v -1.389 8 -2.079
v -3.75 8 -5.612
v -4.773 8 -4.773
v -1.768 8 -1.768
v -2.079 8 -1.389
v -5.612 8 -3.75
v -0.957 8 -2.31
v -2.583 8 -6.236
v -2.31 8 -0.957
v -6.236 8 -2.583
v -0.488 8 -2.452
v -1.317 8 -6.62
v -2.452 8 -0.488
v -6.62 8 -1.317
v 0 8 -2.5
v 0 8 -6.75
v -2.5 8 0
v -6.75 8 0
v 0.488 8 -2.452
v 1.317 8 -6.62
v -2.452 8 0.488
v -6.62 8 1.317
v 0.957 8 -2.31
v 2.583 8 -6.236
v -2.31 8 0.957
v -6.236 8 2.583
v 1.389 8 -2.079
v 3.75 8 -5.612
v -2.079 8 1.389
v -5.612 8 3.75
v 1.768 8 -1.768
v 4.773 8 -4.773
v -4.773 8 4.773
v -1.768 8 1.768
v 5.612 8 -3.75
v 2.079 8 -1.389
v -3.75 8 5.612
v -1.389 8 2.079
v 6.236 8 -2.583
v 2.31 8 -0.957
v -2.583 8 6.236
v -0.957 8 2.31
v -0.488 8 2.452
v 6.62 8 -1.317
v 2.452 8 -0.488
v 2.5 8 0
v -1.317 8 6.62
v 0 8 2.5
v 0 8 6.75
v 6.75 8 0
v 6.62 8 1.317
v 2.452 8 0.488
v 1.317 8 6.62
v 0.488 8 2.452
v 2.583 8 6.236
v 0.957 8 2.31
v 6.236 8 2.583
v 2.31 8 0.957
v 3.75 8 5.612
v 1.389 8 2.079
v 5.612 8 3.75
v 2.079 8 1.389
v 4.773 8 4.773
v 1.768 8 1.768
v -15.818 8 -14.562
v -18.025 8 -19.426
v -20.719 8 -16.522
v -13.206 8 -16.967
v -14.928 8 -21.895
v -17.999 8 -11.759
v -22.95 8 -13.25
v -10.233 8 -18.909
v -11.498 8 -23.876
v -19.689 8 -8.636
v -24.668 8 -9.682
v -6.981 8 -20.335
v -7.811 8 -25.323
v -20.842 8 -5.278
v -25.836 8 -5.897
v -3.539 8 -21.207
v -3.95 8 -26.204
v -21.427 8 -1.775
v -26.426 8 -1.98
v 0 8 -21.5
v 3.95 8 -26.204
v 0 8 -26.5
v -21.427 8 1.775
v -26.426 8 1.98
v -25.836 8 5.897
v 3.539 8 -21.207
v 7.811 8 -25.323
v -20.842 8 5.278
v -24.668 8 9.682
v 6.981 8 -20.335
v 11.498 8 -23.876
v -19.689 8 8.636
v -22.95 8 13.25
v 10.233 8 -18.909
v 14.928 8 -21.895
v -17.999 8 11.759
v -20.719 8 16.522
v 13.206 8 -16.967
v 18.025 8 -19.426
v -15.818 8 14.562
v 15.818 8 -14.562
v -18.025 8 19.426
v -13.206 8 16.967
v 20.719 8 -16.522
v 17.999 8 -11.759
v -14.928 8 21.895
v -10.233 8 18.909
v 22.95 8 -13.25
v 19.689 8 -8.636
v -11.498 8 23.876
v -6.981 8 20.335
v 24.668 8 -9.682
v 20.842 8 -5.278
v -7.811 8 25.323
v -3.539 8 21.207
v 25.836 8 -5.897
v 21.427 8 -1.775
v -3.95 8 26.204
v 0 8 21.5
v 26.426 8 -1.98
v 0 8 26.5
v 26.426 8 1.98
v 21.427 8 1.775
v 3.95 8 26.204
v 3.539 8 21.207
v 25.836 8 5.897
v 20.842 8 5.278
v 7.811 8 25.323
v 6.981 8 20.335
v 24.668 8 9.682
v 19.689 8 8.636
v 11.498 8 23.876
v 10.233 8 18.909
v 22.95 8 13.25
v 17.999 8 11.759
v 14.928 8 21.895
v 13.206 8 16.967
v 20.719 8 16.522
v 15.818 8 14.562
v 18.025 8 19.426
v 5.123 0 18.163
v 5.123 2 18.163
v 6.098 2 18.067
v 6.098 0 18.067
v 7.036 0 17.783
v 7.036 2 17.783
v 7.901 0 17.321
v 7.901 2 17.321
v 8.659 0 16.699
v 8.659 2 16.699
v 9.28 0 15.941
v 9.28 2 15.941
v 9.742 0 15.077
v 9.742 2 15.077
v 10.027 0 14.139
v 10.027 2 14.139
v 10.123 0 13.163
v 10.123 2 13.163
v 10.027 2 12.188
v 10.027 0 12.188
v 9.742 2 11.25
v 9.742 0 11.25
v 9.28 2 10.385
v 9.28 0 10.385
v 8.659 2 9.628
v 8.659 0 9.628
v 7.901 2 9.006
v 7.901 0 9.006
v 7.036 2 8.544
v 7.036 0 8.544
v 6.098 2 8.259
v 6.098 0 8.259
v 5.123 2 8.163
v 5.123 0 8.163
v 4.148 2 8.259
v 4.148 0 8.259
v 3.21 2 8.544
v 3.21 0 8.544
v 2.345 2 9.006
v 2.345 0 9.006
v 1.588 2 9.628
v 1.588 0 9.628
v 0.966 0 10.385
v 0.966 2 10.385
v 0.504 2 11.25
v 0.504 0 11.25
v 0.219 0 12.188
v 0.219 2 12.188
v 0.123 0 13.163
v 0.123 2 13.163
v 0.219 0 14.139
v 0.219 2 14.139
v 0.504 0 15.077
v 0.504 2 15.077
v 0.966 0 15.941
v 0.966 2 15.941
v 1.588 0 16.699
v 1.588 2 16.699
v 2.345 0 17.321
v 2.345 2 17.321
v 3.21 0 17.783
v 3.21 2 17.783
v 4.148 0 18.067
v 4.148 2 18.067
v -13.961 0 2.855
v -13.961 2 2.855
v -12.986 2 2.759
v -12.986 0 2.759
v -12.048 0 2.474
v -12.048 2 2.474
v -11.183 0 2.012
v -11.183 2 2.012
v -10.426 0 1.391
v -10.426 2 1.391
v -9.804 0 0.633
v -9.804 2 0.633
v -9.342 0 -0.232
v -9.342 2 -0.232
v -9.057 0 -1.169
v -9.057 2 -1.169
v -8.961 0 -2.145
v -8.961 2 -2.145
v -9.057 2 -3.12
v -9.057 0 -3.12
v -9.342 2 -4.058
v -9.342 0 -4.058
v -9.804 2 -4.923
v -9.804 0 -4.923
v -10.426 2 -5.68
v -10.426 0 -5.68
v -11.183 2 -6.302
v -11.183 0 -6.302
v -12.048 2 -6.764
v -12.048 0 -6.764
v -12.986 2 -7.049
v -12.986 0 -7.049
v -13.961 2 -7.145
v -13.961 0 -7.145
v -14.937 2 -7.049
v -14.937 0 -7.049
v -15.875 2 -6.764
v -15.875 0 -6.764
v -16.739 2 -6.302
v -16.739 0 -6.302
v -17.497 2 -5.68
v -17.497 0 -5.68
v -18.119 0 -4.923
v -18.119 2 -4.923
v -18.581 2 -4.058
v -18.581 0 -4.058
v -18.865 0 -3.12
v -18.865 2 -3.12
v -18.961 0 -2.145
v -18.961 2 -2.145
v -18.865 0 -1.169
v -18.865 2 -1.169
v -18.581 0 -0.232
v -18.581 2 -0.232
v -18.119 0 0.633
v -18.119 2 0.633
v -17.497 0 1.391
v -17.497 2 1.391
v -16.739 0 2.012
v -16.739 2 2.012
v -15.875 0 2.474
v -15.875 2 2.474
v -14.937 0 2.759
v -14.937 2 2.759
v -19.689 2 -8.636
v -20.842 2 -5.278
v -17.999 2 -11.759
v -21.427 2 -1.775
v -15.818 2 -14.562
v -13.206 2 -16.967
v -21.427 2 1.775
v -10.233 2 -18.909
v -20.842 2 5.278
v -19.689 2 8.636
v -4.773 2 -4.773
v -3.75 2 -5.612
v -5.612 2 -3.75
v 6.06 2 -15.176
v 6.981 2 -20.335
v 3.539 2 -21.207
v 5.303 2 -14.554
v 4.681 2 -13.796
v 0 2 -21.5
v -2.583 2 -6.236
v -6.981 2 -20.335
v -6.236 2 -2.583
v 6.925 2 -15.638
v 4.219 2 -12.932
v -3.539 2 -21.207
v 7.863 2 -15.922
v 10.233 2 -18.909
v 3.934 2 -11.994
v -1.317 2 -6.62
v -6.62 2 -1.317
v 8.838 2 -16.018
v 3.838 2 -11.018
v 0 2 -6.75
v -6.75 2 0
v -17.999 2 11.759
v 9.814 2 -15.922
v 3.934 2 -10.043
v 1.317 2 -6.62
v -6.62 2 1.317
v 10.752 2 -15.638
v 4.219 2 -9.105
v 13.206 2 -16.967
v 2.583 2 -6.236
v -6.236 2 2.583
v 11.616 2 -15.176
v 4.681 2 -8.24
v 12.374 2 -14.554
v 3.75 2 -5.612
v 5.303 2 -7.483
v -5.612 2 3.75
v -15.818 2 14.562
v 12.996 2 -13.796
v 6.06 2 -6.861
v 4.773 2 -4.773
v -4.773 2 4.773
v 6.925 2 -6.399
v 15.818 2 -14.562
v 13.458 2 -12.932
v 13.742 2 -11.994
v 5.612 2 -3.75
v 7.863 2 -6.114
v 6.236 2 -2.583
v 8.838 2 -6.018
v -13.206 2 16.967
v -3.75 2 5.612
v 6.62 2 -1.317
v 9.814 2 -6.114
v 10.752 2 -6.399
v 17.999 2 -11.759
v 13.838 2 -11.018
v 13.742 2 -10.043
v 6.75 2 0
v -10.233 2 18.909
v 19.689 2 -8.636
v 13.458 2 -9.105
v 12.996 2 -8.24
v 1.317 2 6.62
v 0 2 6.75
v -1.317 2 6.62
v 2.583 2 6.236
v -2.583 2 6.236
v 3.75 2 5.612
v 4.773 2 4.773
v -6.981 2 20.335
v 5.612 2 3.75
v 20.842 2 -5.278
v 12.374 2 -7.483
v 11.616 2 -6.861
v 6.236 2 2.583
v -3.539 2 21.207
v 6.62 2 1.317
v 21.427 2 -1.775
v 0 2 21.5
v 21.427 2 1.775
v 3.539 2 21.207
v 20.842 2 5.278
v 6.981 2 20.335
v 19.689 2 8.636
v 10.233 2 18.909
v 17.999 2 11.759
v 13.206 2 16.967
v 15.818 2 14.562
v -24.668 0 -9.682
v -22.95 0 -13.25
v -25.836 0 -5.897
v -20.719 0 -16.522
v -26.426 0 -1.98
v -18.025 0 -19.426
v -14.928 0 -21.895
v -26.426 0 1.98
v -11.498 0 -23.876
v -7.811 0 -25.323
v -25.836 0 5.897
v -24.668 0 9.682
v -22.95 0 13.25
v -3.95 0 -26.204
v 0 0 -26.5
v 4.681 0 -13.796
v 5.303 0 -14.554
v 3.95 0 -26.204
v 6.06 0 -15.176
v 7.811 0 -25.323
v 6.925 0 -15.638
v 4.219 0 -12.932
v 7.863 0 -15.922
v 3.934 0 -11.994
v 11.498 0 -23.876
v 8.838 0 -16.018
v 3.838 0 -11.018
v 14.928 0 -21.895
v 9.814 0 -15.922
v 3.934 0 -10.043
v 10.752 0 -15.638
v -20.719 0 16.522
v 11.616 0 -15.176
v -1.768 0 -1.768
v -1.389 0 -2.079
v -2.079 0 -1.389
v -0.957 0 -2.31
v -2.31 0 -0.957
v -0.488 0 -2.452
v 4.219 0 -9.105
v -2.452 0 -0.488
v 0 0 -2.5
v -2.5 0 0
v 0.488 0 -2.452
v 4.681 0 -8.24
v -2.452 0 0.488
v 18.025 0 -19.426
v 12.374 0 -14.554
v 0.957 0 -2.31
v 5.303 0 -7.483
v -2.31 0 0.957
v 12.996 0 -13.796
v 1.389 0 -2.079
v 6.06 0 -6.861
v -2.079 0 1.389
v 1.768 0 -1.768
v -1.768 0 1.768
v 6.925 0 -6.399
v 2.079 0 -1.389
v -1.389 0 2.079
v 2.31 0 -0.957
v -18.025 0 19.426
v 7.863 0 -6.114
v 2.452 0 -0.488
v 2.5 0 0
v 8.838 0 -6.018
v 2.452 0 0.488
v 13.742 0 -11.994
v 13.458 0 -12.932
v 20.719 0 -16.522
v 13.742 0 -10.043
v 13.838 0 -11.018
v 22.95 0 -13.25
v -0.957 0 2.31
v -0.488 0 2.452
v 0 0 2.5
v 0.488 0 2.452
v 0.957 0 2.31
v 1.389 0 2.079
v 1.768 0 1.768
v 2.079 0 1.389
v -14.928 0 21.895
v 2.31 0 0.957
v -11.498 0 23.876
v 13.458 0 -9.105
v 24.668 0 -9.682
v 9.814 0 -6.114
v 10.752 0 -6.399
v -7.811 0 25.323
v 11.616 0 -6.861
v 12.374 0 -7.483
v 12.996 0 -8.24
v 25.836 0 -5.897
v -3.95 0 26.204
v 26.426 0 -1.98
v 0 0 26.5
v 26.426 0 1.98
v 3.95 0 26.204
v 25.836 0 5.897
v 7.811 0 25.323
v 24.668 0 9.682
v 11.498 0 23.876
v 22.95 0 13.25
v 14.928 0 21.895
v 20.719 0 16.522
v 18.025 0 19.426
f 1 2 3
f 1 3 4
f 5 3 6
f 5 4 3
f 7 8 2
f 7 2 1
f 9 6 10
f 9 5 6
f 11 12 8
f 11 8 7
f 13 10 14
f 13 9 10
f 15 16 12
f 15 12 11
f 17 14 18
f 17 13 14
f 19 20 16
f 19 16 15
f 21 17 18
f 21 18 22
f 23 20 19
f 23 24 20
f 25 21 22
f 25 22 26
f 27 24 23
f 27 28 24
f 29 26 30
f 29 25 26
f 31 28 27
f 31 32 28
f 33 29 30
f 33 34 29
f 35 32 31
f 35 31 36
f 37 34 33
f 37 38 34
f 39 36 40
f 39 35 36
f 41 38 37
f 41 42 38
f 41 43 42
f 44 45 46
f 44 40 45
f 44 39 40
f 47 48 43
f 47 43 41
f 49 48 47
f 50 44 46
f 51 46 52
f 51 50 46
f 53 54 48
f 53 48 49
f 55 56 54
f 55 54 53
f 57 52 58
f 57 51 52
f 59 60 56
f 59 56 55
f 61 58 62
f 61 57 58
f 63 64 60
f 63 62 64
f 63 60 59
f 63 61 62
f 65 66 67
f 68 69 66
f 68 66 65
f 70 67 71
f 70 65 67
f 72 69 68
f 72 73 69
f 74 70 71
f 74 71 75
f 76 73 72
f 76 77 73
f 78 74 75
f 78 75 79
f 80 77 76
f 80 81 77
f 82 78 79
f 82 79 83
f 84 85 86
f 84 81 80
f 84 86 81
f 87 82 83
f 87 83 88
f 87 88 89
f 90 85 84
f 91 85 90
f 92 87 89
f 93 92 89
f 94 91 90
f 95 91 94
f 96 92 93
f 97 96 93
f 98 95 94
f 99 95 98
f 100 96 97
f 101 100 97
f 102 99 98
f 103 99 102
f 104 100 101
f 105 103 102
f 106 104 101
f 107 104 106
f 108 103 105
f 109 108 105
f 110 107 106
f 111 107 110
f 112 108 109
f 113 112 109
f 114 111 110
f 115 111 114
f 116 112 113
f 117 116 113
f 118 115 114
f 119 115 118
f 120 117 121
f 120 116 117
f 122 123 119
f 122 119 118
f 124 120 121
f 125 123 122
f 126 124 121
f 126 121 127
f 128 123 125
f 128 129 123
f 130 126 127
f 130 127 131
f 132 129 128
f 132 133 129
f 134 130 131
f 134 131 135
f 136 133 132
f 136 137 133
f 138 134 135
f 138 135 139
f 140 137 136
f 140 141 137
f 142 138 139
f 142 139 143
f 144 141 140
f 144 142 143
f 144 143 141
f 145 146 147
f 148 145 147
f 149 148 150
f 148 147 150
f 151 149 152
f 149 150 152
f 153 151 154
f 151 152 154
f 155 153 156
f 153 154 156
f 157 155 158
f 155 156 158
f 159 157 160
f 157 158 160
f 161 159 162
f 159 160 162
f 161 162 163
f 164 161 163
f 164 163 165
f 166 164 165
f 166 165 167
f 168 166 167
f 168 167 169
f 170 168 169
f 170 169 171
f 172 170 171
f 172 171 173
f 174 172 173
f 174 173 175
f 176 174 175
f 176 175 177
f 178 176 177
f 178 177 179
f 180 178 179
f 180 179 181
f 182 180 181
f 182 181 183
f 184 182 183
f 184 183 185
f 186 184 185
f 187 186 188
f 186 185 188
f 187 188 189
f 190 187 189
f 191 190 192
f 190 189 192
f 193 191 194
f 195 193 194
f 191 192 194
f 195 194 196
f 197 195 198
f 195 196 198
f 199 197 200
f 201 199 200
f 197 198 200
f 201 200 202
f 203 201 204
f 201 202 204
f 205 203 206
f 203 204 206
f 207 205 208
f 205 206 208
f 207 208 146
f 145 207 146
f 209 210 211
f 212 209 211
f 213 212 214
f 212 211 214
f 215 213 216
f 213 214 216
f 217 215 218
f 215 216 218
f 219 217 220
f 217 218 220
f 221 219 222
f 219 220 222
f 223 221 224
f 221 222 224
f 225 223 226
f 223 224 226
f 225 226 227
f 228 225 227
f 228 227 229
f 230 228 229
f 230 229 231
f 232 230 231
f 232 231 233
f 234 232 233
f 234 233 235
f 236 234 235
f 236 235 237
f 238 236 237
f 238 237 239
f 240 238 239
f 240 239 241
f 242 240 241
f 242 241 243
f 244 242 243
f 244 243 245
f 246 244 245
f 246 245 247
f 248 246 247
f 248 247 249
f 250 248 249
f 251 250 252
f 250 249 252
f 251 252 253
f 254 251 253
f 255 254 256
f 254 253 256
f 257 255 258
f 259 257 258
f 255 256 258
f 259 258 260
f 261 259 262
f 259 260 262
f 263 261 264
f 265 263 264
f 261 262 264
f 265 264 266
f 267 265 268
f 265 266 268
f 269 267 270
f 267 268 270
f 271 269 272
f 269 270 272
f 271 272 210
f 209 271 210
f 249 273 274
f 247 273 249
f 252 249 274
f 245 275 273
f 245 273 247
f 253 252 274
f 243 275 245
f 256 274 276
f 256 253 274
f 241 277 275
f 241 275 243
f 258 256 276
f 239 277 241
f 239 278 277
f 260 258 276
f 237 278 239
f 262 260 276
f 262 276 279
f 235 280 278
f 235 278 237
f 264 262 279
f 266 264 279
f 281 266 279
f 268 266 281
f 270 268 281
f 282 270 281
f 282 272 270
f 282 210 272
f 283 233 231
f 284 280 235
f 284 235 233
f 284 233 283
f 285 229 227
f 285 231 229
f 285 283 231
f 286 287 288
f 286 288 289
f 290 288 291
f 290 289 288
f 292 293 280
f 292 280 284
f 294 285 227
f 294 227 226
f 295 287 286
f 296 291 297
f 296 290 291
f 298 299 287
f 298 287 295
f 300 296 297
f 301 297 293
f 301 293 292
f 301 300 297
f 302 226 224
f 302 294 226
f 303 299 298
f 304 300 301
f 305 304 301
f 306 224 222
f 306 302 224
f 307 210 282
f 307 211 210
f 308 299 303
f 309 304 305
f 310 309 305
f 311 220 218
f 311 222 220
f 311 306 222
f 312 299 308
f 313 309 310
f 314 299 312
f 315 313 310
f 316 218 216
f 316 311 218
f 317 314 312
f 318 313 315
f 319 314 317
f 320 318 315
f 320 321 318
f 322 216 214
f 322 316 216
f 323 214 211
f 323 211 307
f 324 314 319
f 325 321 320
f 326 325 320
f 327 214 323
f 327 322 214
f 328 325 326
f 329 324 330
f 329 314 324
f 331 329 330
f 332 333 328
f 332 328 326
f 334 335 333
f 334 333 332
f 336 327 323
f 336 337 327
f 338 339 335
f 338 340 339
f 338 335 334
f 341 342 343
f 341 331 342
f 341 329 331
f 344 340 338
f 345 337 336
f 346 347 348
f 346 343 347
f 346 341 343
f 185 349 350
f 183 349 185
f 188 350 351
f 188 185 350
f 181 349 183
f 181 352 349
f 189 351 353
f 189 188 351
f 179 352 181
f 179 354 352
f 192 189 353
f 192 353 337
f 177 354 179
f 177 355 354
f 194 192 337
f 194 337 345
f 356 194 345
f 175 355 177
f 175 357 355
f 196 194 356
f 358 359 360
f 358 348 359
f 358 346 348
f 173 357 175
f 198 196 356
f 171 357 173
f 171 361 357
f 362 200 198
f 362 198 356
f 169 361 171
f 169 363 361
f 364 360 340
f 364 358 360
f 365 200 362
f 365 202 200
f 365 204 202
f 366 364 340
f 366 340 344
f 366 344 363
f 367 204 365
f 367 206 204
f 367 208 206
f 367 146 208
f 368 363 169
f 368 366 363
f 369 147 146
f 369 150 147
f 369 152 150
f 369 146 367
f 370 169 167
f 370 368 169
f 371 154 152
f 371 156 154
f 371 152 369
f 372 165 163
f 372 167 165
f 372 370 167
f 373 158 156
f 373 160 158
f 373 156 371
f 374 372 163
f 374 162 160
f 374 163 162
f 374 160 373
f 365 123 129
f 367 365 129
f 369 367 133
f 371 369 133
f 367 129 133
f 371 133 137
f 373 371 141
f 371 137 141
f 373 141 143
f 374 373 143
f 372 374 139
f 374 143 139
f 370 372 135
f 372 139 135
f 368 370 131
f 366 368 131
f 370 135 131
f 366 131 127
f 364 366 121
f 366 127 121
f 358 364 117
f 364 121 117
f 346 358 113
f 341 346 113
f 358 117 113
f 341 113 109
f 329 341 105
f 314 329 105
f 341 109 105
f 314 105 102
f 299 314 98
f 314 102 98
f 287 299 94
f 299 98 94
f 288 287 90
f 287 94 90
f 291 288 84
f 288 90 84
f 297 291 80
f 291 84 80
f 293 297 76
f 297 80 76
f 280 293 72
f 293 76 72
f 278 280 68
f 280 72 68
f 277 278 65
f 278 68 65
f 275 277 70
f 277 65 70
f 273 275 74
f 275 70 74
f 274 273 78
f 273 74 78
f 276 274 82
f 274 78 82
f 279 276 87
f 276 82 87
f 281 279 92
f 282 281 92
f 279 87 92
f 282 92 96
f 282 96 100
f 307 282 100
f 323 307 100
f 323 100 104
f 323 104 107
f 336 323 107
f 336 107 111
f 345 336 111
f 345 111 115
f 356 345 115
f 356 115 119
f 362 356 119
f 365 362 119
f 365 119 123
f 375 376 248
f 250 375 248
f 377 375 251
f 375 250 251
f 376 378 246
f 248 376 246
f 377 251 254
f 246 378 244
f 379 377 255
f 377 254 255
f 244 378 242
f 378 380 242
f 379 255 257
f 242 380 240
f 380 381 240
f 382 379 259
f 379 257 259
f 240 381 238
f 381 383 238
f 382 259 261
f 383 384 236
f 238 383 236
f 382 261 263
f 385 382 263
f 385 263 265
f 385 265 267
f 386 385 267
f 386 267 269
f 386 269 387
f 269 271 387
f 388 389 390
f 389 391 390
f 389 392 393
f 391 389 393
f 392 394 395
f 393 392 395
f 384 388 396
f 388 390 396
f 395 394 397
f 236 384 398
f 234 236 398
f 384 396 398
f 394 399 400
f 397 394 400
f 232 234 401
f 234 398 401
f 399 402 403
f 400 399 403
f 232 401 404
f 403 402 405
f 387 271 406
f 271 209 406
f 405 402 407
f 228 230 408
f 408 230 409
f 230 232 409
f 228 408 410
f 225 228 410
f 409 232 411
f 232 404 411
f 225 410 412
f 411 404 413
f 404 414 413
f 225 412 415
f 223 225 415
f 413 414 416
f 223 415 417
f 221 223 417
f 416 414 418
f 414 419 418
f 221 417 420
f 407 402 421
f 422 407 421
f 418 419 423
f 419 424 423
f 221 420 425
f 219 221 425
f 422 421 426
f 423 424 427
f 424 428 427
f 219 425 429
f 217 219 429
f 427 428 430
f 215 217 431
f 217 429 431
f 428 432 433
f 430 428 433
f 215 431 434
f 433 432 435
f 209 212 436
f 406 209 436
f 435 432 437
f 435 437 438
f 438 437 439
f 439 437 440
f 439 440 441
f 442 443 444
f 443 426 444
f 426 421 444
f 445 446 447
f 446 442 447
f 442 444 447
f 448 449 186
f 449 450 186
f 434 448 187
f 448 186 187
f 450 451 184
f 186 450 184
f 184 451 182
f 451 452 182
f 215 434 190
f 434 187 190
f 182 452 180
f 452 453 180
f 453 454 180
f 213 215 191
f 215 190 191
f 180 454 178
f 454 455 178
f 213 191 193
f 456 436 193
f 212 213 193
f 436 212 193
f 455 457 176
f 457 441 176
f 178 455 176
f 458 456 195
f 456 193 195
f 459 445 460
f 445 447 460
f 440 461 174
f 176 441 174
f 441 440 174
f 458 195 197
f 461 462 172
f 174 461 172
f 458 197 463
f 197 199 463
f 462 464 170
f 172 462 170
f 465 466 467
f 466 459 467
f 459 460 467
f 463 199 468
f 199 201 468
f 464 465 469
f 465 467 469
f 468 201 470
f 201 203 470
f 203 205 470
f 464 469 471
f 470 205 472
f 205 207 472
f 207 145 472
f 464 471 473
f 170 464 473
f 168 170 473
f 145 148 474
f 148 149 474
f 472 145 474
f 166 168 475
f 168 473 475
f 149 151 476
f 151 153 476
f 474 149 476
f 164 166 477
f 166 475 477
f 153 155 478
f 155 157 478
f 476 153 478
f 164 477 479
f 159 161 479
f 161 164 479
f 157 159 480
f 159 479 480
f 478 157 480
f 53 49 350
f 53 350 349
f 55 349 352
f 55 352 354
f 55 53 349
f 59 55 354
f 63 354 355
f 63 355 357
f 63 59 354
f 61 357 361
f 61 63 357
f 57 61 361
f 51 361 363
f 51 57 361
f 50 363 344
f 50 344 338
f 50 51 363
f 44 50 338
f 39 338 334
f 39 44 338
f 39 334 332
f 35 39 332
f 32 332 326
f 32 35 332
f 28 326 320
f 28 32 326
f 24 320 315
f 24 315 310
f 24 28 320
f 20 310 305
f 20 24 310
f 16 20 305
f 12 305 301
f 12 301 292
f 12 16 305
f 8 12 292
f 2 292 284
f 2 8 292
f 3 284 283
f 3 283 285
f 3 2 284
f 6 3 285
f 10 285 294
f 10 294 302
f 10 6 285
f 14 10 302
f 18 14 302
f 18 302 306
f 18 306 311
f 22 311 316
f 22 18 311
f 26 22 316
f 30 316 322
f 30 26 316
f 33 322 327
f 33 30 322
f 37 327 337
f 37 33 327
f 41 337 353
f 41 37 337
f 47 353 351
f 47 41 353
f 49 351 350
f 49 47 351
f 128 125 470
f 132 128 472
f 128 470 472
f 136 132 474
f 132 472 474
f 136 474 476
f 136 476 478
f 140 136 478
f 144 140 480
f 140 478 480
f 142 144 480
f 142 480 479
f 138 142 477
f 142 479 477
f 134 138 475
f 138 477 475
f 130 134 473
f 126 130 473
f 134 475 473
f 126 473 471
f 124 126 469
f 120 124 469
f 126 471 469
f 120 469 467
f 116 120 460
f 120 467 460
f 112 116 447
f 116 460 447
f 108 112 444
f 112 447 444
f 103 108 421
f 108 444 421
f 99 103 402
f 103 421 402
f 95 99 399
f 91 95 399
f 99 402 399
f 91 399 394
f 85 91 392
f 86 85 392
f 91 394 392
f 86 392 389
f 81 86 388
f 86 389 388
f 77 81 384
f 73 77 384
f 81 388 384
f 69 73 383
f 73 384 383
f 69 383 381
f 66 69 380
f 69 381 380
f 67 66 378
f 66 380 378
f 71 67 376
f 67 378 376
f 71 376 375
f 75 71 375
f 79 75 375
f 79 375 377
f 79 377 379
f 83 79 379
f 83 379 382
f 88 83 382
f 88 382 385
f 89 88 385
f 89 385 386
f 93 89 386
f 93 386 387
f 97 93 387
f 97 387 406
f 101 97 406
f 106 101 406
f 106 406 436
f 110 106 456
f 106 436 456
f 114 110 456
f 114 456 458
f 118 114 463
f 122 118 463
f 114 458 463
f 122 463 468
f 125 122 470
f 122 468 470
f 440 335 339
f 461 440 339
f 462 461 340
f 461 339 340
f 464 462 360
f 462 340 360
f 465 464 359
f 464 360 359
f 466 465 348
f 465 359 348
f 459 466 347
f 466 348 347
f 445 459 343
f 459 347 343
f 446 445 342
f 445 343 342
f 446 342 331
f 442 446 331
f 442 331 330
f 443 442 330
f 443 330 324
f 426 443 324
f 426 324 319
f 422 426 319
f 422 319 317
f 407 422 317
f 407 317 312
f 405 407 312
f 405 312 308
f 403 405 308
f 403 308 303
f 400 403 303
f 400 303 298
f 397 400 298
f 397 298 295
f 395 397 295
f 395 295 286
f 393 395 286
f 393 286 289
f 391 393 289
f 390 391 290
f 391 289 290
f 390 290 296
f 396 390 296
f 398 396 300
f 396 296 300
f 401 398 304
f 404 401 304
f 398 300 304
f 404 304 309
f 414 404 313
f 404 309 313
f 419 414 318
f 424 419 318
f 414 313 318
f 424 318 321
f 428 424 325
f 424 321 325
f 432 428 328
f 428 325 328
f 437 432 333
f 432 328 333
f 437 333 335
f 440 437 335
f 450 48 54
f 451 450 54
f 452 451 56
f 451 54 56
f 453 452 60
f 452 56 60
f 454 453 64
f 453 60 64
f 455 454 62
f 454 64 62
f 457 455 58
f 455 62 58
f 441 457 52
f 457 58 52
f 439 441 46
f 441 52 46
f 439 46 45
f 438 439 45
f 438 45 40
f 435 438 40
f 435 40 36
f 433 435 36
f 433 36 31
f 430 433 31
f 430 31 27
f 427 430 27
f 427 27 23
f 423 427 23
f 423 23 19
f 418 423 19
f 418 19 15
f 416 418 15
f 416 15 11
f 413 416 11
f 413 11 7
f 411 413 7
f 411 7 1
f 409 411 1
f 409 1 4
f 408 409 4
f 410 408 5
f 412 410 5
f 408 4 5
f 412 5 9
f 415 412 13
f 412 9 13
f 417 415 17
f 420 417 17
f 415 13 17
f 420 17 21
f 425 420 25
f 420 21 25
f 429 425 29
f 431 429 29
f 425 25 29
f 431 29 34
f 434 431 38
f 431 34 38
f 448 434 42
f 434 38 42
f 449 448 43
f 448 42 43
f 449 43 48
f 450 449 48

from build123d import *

# Parameters (mm, degrees)
ESQUISSE1_R             = 26.5
BOSS_EXTRU_1_DEPTH      = 8
ESQUISSE2_R             = 21.5
ESQUISSE2_R_2           = 6.75
ENL_V_MAT_EXTRU_1_DEPTH = 6
ESQUISSE3_R             = 2.5
ENL_V_MAT_EXTRU_2_DEPTH = 39.321012513
ESQUISSE4_R             = 5
ENL_V_MAT_EXTRU_3_DEPTH = 38.953919429


with BuildPart() as part:
    # Esquisse1 → Boss.-Extru.1 (new body)
    with BuildSketch(Plane(origin=(0, 0, 0), x_dir=(1, 0, 0), z_dir=(0, 1, 0))):
        with Locations(Location((0, 0, 0), (0, 0, 270))):
            Circle(ESQUISSE1_R)
    extrude(amount=BOSS_EXTRU_1_DEPTH)

    # Esquisse2 → Enlèv. mat.-Extru.1 (cut)
    with BuildSketch(Plane(origin=(0, 8, 0), x_dir=(1, 0, 0), z_dir=(0, 1, 0))):
        with Locations(Location((0, 0, 0), (0, 0, 270))):
            Circle(ESQUISSE2_R)
        with Locations(Location((0, 0, 0), (0, 0, 270))):
            Circle(ESQUISSE2_R_2, mode=Mode.SUBTRACT)
    extrude(amount=-ENL_V_MAT_EXTRU_1_DEPTH, mode=Mode.SUBTRACT)

    # Esquisse3 → Enlèv. mat.-Extru.2 (cut, through all)
    with BuildSketch(Plane(origin=(0, 8, 0), x_dir=(1, 0, 0), z_dir=(0, 1, 0))):
        with Locations(Location((0, 0, 0), (0, 0, 270))):
            Circle(ESQUISSE3_R)
    extrude(amount=-ENL_V_MAT_EXTRU_2_DEPTH, mode=Mode.SUBTRACT)

    # Esquisse4 → Enlèv. mat.-Extru.3 (cut, through all)
    with BuildSketch(Plane(origin=(0, 2, 0), x_dir=(-1, 0, 0), z_dir=(0, 1, 0))):
        with Locations(Location((13.961193072, -2.144927276, 0), (0, 0, 90))):
            Circle(ESQUISSE4_R)
        with Locations(Location((-5.123035026, 13.163211505, 0), (0, 0, 90))):
            Circle(ESQUISSE4_R)
        with Locations(Location((-8.838158046, -11.018284229, 0), (0, 0, 90))):
            Circle(ESQUISSE4_R)
    extrude(amount=-ENL_V_MAT_EXTRU_3_DEPTH, mode=Mode.SUBTRACT)


solid = part.part
